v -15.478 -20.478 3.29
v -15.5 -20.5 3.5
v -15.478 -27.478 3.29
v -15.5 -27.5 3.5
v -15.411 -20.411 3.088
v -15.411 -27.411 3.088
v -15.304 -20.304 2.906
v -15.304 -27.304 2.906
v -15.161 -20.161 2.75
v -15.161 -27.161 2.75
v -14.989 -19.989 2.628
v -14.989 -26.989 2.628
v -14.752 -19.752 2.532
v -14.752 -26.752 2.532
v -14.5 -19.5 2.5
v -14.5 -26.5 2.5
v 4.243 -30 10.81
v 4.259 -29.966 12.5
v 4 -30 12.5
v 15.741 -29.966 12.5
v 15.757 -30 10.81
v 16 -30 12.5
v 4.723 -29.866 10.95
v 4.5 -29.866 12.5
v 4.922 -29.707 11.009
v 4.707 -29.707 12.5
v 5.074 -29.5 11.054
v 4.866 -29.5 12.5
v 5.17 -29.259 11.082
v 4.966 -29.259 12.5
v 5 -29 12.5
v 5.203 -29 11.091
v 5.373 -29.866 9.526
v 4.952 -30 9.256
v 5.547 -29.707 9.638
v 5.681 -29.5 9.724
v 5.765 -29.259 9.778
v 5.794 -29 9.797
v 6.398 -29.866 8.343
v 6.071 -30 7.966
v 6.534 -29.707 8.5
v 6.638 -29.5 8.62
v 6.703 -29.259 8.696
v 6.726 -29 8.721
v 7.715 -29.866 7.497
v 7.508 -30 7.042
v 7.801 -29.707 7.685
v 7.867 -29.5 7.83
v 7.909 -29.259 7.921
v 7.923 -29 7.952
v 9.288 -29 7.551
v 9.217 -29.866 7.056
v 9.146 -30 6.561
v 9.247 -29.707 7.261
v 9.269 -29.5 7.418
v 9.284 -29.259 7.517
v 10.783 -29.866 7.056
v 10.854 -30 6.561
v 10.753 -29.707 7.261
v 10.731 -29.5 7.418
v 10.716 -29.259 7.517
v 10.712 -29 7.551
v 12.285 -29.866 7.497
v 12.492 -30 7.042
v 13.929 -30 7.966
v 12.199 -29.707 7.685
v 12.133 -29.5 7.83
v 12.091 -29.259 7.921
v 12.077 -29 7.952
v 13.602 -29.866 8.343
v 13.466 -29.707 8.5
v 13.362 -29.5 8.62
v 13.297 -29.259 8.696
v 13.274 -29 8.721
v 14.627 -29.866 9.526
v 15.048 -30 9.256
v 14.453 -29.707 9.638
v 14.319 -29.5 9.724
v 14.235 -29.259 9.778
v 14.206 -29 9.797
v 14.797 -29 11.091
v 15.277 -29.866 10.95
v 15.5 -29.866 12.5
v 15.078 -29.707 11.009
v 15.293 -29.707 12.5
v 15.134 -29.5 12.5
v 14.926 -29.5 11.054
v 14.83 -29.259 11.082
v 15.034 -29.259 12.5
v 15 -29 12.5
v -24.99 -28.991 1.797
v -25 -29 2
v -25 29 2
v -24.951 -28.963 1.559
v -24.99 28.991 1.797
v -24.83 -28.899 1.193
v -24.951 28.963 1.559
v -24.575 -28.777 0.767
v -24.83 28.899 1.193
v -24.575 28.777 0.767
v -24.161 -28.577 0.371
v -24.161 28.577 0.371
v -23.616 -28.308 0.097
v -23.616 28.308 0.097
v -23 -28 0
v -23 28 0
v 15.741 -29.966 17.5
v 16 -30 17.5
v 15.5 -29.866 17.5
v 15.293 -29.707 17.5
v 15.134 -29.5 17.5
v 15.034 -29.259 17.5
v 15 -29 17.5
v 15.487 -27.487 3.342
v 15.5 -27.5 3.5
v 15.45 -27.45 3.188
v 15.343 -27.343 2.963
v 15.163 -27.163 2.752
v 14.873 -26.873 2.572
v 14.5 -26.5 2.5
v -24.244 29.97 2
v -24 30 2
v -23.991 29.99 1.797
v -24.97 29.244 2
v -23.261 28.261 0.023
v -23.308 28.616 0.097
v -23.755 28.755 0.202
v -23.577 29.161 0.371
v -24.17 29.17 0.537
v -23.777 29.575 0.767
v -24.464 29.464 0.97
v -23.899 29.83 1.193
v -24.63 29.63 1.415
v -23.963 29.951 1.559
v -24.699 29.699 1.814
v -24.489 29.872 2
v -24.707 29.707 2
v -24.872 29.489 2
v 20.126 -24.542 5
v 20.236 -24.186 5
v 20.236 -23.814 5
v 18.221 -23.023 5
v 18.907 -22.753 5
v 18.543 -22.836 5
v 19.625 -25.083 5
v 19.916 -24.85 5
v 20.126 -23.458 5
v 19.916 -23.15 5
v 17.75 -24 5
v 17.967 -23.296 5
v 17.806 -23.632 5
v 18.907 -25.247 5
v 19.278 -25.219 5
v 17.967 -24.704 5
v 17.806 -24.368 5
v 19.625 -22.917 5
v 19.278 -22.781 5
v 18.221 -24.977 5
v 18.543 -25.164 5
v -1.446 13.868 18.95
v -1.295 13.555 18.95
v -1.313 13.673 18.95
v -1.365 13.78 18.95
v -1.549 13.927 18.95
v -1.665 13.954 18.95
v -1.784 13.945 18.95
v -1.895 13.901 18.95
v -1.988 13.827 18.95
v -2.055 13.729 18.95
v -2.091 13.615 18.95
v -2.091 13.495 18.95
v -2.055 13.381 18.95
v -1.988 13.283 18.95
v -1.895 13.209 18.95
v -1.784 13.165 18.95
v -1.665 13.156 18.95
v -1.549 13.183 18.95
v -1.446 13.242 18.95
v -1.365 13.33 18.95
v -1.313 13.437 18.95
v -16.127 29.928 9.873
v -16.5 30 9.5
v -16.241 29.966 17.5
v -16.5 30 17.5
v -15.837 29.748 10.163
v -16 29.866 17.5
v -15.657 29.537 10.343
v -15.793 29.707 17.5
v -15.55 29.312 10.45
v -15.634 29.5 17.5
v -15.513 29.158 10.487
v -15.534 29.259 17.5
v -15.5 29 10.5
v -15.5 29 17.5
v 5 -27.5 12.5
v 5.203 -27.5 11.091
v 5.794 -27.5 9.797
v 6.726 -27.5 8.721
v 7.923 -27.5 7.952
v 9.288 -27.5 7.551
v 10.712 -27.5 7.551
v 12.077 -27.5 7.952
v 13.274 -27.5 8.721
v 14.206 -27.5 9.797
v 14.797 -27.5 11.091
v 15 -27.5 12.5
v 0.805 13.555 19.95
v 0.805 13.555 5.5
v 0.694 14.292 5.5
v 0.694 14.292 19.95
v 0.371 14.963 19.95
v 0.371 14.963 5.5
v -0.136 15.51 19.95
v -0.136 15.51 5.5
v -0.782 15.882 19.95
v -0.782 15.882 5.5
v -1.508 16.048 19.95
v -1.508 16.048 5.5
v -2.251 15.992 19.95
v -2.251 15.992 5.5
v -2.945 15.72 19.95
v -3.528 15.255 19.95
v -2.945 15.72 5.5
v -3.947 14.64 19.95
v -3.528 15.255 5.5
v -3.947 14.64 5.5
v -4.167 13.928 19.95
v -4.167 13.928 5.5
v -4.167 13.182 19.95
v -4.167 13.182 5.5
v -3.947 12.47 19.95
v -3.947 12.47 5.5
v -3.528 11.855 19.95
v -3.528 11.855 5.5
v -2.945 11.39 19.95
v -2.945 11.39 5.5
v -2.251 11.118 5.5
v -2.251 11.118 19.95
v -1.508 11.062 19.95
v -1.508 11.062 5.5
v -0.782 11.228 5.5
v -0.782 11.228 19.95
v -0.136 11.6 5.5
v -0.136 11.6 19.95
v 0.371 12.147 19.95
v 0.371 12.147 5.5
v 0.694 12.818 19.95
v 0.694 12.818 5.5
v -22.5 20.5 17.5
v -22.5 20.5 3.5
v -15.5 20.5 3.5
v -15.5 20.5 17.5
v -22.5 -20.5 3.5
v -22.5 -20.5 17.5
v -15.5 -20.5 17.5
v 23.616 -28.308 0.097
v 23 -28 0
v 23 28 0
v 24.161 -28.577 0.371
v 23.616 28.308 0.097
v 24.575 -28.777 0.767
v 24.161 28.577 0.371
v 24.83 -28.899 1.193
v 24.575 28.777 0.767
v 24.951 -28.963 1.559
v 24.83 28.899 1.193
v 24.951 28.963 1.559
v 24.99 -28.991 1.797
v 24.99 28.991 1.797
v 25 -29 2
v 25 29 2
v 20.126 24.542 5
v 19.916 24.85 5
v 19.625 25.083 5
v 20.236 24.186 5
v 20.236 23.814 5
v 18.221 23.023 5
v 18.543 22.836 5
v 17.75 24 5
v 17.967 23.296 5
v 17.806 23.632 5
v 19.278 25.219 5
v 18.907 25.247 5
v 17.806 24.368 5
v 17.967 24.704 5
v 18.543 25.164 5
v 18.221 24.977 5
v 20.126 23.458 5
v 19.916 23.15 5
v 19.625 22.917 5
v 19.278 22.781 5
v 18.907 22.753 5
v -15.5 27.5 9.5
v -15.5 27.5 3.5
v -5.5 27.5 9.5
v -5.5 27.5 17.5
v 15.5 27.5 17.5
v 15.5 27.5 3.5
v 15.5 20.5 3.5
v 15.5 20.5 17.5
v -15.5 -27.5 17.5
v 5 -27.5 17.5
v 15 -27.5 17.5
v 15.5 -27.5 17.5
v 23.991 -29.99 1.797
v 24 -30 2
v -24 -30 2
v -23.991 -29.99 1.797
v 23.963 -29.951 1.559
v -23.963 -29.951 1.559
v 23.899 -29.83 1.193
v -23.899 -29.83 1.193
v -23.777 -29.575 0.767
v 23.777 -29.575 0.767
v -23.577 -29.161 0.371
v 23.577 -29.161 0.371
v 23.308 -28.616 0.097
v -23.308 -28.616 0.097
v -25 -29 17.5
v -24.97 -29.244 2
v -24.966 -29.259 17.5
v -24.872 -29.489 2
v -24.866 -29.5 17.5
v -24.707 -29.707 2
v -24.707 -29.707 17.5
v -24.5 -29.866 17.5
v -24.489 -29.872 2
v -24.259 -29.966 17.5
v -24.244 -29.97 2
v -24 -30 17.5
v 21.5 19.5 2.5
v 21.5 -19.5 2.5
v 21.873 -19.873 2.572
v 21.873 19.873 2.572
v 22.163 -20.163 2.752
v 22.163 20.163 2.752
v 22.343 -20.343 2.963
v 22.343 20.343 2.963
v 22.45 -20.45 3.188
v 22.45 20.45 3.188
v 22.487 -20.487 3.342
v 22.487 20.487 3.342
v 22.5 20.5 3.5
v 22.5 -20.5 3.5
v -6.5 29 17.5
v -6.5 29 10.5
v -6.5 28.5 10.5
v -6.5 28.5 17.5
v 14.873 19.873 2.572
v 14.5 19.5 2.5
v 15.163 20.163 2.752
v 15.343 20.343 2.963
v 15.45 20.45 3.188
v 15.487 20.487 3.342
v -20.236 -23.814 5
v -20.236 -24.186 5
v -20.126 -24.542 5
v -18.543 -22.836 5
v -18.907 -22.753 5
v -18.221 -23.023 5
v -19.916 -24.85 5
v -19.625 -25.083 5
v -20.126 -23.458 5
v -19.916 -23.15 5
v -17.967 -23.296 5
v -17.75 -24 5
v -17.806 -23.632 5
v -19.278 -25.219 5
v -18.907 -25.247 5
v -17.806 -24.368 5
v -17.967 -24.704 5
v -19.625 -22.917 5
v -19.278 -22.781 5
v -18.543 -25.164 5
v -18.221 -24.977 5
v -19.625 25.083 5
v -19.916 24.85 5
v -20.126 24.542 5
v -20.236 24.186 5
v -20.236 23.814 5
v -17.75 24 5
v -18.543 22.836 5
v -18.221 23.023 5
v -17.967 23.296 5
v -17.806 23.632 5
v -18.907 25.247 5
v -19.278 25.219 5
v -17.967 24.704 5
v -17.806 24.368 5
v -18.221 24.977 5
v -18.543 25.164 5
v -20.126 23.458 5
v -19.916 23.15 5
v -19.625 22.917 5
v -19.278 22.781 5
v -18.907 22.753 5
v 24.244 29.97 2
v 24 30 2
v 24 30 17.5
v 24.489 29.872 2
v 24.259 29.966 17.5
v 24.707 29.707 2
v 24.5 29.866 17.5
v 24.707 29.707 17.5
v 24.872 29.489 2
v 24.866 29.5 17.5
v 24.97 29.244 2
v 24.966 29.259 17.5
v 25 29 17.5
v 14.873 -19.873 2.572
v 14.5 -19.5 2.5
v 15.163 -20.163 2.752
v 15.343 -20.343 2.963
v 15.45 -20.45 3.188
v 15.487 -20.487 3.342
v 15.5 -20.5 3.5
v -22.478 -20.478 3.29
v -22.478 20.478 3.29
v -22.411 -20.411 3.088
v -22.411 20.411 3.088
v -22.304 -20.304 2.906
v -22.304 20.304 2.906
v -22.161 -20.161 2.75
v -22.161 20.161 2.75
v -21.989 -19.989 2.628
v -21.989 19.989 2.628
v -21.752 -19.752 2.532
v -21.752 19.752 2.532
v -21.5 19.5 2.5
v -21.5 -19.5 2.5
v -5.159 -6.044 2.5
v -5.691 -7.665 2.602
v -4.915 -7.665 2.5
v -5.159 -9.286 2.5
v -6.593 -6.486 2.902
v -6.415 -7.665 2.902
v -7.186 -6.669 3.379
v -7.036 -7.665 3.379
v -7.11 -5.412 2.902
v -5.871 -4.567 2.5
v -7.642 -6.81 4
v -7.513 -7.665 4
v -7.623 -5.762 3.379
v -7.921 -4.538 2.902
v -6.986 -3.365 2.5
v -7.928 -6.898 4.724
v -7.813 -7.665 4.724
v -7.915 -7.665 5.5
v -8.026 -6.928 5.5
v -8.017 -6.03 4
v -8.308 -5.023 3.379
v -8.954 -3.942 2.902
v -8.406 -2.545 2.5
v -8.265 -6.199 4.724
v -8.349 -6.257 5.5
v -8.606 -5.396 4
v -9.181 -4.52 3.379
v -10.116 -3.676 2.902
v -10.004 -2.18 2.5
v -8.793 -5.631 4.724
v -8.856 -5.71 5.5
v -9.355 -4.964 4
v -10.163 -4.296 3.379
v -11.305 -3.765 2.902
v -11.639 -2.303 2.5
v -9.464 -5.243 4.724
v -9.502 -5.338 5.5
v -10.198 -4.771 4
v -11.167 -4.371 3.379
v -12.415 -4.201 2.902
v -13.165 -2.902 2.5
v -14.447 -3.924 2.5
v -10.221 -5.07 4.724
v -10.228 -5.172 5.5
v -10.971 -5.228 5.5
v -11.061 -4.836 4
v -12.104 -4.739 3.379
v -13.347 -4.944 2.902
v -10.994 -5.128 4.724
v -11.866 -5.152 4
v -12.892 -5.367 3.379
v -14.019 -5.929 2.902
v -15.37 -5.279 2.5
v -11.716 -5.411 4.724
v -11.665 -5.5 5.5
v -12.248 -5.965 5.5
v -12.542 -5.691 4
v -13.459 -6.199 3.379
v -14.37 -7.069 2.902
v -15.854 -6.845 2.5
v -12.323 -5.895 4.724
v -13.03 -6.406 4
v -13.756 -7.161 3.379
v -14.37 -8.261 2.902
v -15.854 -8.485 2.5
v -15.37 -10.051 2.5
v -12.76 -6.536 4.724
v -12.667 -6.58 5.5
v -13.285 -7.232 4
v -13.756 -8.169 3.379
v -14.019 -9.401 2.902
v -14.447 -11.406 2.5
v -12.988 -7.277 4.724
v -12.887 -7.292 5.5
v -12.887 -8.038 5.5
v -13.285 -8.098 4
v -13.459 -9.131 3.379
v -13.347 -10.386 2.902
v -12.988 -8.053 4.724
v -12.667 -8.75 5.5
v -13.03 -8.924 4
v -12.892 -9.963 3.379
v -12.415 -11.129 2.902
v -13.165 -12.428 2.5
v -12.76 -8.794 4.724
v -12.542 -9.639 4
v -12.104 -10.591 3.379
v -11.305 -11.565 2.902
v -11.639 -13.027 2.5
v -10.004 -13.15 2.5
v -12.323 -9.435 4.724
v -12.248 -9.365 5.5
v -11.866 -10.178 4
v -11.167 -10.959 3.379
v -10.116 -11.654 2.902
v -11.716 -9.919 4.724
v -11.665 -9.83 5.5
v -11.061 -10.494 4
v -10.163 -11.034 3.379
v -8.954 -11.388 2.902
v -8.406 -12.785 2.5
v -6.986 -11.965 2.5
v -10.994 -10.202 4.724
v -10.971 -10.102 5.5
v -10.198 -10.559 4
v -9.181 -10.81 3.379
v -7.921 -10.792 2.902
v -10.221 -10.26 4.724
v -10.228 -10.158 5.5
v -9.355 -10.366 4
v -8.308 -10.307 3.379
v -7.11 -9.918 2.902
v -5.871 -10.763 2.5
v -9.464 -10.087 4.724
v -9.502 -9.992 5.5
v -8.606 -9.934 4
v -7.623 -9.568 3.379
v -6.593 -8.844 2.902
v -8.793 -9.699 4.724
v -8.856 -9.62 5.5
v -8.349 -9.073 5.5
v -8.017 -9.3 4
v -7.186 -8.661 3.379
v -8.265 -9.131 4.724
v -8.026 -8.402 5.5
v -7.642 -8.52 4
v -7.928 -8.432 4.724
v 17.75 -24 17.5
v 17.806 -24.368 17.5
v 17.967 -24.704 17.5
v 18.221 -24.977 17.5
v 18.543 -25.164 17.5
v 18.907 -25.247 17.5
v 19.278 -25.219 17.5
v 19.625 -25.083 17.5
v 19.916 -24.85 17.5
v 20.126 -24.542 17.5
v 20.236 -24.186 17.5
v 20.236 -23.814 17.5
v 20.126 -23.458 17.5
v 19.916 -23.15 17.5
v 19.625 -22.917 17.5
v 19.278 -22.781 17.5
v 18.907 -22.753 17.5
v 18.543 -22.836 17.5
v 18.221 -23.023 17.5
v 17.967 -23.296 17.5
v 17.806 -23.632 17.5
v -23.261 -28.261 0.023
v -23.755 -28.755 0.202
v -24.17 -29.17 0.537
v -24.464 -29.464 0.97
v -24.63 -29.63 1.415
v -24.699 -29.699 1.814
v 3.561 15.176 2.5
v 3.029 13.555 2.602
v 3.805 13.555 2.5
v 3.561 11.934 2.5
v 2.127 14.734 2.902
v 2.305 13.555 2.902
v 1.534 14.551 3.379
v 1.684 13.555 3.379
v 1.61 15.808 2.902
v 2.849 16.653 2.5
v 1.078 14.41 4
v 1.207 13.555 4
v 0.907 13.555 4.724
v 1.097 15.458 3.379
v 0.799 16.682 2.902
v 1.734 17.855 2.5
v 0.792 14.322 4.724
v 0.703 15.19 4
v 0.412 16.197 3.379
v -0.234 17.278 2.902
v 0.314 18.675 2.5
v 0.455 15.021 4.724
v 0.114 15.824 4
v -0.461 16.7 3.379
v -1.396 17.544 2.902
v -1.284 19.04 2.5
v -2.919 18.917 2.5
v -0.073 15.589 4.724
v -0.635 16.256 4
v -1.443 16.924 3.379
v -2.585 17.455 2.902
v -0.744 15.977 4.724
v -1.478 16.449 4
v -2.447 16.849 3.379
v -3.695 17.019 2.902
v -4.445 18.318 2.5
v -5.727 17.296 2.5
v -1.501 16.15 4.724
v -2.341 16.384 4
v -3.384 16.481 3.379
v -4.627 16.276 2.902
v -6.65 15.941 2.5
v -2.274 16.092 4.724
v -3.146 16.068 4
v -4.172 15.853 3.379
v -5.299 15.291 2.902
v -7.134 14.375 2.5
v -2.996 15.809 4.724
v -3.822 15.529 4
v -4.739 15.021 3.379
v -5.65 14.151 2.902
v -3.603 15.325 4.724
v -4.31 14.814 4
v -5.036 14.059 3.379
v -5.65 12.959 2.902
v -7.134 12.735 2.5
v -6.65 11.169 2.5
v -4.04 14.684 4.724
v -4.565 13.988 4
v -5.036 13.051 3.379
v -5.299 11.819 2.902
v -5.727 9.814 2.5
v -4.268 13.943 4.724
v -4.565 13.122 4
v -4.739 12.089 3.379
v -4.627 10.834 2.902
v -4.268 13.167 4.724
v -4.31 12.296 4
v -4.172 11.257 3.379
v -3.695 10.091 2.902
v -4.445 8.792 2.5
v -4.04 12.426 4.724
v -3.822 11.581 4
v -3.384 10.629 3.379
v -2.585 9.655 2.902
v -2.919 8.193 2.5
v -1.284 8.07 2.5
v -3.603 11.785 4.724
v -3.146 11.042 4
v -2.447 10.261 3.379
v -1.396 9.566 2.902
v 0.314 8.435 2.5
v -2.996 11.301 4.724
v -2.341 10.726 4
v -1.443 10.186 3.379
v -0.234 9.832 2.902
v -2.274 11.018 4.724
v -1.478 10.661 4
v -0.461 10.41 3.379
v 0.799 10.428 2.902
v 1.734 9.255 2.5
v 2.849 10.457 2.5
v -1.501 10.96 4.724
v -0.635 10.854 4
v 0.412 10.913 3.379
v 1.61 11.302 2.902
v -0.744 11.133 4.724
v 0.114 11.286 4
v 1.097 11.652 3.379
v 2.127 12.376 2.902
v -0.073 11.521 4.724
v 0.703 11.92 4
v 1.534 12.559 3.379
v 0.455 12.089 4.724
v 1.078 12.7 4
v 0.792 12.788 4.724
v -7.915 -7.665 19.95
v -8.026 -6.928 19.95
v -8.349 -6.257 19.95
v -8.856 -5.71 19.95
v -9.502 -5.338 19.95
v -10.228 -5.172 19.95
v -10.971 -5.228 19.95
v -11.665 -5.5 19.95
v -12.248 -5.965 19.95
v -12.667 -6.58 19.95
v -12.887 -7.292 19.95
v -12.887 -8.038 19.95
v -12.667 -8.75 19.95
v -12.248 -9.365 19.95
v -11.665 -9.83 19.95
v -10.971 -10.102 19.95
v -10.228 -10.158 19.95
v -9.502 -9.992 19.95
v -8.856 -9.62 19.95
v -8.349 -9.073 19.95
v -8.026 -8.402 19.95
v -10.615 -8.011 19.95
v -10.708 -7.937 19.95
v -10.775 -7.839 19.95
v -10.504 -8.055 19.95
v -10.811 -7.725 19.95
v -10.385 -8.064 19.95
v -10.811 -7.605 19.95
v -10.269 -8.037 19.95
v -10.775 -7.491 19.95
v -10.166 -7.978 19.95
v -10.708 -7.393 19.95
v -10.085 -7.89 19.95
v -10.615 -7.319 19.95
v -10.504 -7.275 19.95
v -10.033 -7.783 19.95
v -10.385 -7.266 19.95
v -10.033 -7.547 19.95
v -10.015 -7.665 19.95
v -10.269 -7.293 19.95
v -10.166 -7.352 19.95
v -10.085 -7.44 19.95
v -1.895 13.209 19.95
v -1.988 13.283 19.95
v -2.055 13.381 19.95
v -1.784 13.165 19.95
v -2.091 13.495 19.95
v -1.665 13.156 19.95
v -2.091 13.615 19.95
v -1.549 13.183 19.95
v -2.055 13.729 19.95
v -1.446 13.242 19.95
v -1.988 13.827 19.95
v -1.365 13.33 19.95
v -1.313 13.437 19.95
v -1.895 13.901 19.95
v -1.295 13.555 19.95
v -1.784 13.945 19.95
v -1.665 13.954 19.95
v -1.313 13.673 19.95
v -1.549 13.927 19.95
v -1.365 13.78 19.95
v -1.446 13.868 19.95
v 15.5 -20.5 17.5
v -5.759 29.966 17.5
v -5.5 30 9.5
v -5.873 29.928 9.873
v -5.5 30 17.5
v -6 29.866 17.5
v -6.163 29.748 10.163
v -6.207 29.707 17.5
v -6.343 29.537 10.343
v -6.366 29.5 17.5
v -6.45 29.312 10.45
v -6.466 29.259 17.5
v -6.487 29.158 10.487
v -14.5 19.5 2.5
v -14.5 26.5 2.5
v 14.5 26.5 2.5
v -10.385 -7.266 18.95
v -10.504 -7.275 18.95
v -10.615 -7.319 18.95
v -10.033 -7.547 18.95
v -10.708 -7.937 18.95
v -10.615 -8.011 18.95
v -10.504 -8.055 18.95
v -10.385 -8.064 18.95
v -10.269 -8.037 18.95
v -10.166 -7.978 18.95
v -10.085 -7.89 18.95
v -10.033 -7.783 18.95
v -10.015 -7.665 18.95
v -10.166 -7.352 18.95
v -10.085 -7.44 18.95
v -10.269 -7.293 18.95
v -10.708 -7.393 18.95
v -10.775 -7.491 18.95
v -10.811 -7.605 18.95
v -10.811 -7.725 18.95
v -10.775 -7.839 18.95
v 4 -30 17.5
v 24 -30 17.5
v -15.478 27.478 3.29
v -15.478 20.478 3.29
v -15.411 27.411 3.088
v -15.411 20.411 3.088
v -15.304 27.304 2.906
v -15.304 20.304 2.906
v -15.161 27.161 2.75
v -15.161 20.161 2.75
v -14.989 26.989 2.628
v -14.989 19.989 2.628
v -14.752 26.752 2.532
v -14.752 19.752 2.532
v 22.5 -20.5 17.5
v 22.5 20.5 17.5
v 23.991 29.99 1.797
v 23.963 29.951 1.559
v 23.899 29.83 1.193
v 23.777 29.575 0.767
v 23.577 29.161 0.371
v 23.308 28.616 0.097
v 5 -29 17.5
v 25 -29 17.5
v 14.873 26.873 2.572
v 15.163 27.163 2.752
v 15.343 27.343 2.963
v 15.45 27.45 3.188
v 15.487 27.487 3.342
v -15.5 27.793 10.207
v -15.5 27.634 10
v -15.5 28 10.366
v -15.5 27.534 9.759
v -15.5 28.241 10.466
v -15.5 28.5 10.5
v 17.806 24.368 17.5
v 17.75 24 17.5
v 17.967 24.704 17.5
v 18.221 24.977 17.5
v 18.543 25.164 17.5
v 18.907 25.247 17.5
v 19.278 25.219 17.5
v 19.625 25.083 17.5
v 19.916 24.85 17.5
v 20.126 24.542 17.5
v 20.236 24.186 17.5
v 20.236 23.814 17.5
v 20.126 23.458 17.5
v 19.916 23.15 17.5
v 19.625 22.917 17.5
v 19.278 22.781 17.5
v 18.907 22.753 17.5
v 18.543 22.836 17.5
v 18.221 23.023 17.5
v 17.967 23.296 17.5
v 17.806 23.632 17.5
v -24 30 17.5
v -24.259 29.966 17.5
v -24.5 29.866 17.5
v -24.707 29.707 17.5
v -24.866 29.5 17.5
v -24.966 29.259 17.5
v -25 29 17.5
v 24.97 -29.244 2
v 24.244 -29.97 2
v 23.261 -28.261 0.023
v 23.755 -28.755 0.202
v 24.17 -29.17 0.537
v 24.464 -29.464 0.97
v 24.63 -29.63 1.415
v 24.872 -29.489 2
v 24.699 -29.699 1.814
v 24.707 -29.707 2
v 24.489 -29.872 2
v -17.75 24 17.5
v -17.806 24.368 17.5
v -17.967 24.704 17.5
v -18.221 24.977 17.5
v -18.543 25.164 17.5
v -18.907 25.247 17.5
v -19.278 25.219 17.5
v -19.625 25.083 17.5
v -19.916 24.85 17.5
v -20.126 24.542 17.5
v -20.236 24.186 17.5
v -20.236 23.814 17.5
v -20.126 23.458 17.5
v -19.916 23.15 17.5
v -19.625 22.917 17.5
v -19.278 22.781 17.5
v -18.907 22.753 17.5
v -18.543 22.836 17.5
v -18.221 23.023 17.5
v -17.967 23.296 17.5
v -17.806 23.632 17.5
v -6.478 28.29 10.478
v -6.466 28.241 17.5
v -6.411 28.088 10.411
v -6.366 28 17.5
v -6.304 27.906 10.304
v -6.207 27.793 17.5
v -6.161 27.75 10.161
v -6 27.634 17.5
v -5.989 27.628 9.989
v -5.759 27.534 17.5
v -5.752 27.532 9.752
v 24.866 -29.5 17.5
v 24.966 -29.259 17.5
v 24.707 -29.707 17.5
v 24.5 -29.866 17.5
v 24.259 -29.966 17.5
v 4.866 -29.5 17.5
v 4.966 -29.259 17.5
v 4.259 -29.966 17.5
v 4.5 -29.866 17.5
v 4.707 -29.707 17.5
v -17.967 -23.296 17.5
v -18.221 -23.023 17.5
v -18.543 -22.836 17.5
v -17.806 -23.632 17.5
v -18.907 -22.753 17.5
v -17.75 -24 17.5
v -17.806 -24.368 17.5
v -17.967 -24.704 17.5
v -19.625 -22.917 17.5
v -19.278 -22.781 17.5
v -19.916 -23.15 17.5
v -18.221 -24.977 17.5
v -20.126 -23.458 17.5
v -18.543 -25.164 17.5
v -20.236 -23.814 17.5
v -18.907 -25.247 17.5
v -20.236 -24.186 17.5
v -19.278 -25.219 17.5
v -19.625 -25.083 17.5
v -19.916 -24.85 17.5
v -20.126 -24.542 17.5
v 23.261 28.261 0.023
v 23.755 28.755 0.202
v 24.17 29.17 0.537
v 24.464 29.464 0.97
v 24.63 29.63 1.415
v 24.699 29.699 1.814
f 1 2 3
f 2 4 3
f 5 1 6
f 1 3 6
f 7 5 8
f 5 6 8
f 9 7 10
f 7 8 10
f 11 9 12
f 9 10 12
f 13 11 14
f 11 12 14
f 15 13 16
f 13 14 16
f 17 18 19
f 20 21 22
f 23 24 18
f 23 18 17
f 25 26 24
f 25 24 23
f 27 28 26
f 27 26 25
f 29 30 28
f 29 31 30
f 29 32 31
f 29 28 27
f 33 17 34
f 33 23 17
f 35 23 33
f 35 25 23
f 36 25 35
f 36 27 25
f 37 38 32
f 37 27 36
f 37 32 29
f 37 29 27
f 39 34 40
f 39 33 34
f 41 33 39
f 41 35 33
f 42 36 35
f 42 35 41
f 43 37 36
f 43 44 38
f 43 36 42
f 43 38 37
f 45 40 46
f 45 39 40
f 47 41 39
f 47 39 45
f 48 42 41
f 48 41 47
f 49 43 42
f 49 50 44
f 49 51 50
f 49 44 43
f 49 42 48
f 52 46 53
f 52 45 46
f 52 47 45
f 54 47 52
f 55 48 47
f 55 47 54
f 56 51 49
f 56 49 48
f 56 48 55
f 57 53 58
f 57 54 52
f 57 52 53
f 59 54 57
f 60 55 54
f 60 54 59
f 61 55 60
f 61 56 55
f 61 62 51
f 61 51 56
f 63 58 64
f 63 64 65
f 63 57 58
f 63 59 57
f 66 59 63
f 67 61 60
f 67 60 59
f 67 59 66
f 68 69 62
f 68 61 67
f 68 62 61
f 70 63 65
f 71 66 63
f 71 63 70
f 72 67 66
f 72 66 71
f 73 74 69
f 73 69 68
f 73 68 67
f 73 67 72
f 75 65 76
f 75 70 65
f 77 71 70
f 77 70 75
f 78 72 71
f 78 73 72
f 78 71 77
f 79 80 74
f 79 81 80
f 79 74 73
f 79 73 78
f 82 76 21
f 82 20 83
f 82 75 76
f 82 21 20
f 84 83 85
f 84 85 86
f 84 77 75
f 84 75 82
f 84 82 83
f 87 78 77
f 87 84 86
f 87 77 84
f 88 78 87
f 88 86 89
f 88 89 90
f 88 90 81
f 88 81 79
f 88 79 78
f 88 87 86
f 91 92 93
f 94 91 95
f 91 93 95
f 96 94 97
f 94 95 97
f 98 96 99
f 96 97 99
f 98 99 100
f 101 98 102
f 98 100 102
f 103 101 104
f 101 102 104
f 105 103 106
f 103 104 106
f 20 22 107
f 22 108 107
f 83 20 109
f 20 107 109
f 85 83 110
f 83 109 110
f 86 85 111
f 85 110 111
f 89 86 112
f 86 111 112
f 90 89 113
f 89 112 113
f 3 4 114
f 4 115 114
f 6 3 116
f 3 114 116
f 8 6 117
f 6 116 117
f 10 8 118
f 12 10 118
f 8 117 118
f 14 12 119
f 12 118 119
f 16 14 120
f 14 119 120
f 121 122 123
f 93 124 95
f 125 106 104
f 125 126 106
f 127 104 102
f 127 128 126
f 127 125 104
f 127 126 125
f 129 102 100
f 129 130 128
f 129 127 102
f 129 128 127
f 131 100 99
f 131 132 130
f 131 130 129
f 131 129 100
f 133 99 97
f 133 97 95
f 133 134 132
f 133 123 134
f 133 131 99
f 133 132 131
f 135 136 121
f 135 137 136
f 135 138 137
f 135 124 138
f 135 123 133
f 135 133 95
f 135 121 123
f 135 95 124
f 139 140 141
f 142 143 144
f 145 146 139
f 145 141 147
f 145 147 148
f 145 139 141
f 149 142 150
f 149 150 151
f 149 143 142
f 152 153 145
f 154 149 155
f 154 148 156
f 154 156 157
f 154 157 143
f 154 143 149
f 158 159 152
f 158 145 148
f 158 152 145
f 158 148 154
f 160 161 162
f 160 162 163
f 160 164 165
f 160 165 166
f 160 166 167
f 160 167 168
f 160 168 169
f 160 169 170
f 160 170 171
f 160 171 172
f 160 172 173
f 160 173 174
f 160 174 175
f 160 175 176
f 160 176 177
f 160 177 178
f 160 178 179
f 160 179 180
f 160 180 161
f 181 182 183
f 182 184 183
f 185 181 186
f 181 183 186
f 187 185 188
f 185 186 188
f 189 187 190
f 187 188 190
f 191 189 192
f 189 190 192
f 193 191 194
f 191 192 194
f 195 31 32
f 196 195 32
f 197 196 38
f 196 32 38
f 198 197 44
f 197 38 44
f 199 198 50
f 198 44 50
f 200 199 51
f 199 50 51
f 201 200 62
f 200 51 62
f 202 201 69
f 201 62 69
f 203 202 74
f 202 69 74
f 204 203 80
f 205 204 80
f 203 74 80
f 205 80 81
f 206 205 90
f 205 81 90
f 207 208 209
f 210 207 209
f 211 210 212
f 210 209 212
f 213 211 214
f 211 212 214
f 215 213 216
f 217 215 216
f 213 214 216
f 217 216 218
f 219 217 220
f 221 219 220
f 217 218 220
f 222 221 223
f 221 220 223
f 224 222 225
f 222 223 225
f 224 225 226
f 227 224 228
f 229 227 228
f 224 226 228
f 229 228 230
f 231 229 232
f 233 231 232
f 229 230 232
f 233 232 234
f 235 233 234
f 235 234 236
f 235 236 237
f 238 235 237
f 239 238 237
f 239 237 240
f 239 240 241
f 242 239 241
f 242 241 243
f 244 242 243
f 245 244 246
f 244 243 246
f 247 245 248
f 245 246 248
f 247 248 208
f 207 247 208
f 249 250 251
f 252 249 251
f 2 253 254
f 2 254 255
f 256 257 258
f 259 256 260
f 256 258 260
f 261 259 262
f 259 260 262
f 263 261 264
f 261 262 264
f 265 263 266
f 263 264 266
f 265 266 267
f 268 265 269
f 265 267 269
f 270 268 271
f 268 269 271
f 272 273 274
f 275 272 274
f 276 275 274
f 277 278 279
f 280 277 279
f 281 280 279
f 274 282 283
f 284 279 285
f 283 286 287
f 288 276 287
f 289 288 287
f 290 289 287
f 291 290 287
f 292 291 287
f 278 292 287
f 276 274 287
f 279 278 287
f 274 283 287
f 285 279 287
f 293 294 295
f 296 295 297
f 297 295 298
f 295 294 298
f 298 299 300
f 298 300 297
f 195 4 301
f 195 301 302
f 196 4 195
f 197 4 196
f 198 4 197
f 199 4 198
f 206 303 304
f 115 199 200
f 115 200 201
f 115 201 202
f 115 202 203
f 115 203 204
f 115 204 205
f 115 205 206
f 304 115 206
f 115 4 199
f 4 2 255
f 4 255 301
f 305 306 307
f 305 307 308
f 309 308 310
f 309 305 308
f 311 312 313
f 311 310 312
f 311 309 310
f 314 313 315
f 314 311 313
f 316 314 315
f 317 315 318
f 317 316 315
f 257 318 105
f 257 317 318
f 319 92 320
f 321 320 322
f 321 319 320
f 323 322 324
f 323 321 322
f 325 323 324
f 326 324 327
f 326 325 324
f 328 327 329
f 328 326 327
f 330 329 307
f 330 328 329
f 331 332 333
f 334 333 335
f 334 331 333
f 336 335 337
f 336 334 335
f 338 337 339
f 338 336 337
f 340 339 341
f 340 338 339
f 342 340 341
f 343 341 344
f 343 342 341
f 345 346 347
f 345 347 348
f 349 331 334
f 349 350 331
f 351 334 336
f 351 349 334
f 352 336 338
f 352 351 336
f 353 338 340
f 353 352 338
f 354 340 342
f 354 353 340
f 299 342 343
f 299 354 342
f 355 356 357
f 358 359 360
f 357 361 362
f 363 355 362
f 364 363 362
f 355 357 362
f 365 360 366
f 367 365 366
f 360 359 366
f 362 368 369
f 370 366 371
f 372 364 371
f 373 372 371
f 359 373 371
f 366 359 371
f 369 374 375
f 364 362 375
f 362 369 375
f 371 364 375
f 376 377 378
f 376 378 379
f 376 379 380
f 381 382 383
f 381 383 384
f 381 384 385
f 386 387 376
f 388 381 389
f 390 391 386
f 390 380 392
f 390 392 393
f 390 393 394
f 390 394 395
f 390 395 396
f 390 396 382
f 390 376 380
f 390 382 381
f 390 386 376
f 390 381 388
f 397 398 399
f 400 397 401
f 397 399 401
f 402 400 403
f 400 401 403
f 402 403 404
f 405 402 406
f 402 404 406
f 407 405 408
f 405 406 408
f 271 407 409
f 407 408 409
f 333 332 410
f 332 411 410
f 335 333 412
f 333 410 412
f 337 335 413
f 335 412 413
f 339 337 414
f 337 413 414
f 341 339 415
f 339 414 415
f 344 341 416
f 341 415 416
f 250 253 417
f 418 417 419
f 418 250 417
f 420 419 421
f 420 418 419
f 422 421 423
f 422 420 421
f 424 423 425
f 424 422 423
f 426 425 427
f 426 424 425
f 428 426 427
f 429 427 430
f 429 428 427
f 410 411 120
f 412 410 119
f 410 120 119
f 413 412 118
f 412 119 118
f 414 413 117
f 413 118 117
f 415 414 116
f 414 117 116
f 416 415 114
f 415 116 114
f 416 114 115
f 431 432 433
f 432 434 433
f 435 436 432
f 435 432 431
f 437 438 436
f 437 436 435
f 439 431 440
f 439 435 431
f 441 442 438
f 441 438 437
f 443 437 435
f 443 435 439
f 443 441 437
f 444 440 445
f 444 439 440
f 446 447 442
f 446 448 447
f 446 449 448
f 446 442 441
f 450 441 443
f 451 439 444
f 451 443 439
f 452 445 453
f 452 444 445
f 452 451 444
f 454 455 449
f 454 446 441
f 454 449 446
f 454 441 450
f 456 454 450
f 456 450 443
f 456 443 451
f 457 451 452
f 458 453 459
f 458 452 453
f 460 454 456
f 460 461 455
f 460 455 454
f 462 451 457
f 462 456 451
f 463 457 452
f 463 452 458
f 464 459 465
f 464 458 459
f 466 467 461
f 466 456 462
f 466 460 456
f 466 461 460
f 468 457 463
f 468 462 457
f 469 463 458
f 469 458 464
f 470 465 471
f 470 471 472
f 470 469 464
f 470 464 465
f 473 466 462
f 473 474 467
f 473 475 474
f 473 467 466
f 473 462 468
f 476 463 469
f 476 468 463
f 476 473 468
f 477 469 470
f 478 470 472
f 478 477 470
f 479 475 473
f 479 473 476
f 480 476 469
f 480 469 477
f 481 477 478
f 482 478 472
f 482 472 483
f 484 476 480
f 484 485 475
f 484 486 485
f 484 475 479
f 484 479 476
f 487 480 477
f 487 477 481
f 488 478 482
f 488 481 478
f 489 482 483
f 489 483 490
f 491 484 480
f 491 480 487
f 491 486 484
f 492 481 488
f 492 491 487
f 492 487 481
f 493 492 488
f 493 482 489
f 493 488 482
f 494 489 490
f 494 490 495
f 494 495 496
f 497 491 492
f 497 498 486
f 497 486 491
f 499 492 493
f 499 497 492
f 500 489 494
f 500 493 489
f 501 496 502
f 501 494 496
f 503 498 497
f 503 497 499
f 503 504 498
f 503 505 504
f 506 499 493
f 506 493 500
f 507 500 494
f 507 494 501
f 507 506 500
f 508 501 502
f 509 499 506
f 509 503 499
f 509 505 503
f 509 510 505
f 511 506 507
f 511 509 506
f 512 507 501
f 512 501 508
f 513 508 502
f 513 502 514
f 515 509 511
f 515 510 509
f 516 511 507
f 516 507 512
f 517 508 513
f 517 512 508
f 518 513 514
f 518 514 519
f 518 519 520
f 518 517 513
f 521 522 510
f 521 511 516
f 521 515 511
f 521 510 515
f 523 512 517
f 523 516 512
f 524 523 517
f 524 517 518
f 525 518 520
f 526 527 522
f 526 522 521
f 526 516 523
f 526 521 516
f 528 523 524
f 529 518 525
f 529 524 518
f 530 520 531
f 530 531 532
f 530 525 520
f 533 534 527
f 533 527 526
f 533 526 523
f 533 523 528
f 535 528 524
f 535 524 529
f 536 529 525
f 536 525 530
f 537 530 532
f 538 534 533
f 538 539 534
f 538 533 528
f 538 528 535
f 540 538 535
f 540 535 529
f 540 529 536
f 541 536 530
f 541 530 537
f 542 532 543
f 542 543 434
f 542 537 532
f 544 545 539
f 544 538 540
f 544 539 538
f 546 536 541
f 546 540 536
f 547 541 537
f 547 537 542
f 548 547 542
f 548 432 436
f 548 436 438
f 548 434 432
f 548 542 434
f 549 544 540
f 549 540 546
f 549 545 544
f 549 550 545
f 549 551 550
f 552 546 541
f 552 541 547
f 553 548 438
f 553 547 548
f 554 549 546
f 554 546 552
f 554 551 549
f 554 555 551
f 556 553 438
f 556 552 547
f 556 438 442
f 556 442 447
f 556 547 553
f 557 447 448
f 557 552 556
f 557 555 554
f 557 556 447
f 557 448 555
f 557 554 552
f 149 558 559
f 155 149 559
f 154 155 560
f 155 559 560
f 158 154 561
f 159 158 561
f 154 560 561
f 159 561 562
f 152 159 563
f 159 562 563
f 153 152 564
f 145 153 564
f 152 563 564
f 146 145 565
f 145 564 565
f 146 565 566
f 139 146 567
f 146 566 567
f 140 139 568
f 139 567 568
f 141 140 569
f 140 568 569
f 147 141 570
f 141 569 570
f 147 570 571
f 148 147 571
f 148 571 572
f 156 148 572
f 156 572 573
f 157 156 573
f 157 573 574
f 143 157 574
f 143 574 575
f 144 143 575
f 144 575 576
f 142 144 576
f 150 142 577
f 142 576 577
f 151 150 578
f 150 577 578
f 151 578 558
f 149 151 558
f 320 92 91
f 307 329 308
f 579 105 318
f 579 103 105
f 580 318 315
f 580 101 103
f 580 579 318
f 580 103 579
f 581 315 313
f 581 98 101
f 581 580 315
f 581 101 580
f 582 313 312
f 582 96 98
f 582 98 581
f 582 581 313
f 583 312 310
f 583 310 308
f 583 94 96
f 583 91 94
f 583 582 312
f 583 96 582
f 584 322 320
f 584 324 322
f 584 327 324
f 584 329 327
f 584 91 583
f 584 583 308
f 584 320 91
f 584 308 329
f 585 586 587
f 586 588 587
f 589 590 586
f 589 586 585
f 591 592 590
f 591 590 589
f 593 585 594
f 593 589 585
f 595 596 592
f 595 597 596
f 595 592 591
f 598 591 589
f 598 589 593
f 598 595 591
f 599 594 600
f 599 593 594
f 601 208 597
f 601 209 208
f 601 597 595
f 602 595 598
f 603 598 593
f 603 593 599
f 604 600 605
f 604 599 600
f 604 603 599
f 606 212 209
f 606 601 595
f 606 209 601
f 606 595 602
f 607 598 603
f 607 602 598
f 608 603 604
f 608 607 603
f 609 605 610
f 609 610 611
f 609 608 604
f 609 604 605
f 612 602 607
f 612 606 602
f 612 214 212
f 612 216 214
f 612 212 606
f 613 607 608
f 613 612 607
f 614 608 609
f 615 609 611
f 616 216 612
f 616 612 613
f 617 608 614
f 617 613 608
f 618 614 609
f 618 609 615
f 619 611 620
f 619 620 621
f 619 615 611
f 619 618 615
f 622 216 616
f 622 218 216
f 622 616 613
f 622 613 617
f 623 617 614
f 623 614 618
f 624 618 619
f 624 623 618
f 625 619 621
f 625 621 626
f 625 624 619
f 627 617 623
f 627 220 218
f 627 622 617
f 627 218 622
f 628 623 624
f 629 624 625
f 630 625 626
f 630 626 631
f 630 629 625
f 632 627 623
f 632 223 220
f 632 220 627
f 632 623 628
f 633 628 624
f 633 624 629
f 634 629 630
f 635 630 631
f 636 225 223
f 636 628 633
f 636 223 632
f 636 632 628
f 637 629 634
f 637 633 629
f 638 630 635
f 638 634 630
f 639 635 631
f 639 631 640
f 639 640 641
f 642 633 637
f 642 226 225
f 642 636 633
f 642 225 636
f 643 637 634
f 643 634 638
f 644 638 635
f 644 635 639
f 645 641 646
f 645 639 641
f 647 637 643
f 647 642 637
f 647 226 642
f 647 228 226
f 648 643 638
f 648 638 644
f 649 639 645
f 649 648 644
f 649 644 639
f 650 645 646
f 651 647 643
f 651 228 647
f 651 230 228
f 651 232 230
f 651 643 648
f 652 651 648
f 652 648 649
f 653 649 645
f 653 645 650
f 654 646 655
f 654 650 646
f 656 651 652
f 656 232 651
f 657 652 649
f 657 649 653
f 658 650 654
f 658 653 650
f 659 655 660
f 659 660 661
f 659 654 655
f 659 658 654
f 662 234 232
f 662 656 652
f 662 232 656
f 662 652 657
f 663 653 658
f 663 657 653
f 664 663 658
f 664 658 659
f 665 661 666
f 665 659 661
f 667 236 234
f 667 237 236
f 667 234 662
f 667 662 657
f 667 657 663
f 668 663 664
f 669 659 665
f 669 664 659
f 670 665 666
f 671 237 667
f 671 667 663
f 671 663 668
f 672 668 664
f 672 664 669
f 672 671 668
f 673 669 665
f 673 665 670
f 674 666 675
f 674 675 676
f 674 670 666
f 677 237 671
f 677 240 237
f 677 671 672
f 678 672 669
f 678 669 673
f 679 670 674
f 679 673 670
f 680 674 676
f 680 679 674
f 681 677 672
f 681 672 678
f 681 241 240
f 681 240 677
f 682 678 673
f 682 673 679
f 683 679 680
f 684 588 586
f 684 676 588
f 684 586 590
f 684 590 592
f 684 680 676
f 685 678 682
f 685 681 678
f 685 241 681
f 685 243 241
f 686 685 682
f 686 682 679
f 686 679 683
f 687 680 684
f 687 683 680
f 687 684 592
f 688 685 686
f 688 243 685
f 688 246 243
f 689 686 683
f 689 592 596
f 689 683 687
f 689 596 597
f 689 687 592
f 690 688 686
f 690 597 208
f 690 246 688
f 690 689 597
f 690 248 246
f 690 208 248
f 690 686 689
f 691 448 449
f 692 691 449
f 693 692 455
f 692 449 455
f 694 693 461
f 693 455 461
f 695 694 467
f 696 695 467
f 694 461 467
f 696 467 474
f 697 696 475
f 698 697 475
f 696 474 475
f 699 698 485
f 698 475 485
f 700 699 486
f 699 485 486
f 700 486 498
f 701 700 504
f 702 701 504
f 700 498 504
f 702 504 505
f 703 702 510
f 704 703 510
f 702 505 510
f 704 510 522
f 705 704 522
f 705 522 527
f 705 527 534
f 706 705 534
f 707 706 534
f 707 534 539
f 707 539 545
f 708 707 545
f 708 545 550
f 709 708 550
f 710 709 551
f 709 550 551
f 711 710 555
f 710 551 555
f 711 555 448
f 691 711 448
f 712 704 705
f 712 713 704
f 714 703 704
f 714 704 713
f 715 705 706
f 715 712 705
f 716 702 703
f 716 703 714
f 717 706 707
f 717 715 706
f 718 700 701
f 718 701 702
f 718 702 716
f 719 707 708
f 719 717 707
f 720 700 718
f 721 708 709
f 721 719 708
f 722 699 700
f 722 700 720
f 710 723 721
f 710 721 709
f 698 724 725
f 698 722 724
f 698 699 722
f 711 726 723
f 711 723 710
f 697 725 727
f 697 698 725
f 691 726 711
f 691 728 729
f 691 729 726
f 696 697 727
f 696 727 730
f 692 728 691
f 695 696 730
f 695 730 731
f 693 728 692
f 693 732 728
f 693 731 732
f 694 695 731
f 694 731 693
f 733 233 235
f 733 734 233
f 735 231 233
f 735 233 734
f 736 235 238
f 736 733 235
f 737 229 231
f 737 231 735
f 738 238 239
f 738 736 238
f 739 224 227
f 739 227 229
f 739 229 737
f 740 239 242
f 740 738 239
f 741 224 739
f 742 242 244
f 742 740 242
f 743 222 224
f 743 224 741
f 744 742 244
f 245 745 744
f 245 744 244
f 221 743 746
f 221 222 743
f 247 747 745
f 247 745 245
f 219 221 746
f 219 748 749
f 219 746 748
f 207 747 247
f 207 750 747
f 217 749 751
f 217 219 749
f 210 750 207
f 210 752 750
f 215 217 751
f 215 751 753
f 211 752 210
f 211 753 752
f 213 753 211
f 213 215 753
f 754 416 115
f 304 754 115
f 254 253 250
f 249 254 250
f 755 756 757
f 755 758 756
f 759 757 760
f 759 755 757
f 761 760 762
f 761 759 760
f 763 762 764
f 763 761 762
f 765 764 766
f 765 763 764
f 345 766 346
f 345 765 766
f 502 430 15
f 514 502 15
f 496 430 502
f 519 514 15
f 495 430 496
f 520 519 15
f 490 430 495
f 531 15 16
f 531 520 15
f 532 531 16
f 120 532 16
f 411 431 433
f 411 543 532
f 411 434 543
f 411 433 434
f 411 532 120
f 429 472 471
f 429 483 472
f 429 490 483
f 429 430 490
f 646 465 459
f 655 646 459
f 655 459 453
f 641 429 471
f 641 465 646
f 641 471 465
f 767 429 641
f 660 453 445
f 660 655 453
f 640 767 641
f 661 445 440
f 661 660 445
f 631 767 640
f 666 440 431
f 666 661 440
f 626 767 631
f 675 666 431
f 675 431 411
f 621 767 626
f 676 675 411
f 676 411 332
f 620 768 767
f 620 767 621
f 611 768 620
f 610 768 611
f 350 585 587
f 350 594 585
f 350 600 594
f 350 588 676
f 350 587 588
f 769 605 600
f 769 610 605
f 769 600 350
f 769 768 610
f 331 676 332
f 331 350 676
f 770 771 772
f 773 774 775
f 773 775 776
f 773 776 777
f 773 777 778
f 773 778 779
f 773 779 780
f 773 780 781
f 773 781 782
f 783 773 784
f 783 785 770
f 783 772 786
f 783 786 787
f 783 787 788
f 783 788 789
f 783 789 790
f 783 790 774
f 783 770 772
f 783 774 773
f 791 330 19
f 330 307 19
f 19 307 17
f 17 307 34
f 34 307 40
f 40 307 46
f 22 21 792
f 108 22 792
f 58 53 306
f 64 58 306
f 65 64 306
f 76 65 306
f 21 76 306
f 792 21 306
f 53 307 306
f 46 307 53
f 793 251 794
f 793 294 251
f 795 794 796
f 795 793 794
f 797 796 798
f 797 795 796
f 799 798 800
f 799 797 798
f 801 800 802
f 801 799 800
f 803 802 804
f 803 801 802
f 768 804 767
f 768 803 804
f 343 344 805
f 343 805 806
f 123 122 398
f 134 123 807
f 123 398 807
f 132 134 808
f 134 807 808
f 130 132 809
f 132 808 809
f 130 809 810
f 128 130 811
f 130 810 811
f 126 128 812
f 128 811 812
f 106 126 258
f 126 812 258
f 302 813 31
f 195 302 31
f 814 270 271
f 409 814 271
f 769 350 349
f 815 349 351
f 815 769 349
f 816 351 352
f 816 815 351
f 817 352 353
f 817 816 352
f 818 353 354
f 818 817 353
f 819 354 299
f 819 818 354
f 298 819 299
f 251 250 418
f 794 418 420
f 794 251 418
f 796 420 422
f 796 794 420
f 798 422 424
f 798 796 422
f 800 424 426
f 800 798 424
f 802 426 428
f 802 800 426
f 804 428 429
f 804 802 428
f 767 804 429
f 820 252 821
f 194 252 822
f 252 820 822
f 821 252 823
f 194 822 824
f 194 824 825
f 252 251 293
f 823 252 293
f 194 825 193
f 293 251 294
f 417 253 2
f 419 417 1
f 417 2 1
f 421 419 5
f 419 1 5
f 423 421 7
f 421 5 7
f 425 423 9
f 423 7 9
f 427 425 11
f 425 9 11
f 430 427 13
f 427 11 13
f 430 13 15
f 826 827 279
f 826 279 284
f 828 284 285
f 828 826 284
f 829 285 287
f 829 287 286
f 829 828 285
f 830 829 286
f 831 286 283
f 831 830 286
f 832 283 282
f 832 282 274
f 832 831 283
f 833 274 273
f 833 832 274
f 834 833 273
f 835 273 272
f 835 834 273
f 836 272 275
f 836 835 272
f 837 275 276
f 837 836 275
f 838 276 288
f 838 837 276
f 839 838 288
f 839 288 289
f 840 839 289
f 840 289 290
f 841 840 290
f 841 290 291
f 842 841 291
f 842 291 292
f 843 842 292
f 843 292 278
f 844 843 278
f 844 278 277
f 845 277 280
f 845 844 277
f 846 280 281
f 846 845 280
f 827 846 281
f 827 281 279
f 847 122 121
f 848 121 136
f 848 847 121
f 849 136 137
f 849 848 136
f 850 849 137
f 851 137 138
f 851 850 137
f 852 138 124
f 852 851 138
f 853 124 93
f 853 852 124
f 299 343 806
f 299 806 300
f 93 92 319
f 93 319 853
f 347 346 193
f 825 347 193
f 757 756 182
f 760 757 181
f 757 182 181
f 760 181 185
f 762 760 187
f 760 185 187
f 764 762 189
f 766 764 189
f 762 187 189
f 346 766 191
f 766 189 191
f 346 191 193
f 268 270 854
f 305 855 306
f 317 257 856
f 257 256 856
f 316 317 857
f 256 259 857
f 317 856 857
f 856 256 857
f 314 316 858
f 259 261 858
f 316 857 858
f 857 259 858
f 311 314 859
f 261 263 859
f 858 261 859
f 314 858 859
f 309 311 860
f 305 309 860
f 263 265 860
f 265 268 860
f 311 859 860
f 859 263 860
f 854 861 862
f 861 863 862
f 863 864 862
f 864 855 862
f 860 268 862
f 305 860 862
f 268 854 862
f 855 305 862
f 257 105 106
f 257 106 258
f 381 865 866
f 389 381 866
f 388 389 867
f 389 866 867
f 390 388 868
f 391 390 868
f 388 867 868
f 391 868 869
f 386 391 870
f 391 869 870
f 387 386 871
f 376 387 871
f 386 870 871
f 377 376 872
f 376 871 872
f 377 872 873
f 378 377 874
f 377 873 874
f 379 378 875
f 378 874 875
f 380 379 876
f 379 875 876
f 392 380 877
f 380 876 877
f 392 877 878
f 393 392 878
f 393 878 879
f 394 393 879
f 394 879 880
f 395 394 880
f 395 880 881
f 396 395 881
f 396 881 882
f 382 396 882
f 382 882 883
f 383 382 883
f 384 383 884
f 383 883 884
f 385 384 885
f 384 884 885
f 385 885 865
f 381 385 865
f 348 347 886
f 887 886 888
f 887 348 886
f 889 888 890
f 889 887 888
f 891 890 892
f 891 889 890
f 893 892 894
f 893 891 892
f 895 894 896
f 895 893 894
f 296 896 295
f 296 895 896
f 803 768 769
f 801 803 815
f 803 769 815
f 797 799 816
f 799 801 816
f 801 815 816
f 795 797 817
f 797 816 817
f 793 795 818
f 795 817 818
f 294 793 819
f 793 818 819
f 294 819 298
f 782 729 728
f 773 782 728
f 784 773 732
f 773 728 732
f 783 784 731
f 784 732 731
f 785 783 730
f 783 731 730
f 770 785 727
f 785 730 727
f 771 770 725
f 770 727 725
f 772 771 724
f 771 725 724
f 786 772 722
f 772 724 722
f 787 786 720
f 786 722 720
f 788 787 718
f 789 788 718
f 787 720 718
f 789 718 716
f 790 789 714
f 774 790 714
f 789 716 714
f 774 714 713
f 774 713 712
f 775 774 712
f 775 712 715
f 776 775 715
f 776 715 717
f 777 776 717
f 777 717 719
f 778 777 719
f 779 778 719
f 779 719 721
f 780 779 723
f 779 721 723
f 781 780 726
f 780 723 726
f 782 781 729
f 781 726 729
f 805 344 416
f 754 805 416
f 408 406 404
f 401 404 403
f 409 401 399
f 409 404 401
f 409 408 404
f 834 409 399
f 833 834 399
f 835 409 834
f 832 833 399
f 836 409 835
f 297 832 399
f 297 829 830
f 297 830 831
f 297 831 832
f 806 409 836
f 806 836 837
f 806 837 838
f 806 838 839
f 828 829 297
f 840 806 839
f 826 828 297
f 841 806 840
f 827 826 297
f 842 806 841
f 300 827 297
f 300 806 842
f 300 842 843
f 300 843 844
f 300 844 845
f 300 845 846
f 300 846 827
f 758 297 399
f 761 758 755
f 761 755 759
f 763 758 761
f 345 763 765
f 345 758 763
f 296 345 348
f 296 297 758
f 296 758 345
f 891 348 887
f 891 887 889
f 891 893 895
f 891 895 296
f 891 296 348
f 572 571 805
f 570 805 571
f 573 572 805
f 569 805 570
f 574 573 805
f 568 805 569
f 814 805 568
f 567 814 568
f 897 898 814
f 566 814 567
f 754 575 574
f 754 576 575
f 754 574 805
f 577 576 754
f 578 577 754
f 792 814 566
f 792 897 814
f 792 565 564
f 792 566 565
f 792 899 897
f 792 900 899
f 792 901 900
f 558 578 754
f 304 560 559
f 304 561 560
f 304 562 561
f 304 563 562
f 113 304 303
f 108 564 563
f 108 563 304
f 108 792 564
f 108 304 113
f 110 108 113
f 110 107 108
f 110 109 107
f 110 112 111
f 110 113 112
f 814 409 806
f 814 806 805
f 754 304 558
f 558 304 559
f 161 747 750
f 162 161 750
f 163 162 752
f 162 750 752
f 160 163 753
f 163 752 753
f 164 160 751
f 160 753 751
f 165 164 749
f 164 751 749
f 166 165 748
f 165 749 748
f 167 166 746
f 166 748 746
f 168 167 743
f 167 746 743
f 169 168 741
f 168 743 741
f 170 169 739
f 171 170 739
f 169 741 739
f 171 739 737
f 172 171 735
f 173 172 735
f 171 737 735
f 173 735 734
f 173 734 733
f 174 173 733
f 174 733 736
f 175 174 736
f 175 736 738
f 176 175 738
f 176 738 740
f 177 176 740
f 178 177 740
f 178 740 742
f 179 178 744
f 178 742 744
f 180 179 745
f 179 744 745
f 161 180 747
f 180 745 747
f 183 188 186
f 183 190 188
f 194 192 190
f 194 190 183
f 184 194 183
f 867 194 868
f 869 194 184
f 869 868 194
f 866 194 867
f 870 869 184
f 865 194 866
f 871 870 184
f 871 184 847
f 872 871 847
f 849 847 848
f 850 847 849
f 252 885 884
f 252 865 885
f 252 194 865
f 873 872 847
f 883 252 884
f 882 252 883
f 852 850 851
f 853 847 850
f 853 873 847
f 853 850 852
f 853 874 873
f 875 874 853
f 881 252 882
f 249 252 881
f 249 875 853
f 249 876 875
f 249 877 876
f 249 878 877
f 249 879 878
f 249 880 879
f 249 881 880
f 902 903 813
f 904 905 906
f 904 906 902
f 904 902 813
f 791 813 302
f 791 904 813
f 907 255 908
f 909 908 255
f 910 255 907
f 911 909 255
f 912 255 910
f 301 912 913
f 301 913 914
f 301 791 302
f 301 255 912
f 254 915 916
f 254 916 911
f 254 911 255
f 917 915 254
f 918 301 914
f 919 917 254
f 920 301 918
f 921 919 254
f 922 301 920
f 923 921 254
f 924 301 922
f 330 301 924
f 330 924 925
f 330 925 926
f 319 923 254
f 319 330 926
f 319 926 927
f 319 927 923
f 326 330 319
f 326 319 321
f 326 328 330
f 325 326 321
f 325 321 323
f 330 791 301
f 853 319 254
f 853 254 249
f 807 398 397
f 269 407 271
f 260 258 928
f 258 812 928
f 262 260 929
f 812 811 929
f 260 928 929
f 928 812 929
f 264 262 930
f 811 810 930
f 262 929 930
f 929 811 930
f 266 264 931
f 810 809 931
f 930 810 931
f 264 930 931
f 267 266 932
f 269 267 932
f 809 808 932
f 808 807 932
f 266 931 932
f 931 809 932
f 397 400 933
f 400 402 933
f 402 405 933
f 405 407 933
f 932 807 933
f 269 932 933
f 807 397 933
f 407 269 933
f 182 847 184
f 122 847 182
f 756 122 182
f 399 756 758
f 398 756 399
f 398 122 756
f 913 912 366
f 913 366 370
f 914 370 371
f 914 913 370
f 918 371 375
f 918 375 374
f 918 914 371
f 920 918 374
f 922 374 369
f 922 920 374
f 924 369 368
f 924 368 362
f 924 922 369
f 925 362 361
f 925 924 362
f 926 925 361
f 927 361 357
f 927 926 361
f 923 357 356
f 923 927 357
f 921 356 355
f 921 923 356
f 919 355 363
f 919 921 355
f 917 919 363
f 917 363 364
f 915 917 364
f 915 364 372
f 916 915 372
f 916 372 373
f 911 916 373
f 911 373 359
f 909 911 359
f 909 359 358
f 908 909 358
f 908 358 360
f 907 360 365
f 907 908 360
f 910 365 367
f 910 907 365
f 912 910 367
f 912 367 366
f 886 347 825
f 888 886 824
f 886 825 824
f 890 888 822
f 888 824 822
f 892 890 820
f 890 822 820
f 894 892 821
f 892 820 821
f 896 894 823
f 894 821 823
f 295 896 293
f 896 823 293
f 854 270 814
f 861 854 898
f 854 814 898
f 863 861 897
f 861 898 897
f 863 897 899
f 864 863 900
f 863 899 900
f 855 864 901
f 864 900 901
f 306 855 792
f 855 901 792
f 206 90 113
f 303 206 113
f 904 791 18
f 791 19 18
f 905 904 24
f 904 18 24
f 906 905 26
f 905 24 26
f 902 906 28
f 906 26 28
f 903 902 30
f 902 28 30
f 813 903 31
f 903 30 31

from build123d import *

# Parameters (mm, degrees)
SKETCH001_W                   = 50
SKETCH001_H                   = 60
PAD001_DEPTH                  = 17.5
THICKNESS_T                   = -2.5
SKETCH002_R                   = 2.5
PAD002_DEPTH                  = 17.45
SKETCH003_R                   = 0.4
POCKET_DEPTH                  = 1
SKETCH004_W                   = 7
SKETCH004_H                   = 7
PAD003_DEPTH                  = 15
SKETCH004_MIRRORED_2_W        = 7
SKETCH004_MIRRORED_2_H        = 7
PAD003_MIRRORED_2_DEPTH       = 15
SKETCH005_R                   = 1.25
POCKET001_DEPTH               = 12.5
SKETCH005_MIRRORED002_2_R     = 1.25
POCKET001_MIRRORED002_2_DEPTH = 12.5
POCKET002_DEPTH               = 2.5
SKETCH007_W                   = 9
SKETCH007_H                   = 7
POCKET003_DEPTH               = 2.5
FILLET_R                      = 3
FILLET001_R                   = 2
FILLET002_R                   = 1
FILLET003_R                   = 1
FILLET004_R                   = 1
FILLET005_R                   = 1


with BuildPart() as part:
    # Sketch001 → Pad001 (new body)
    with BuildSketch(Plane.XY):
        Rectangle(SKETCH001_W, SKETCH001_H)
    extrude(amount=PAD001_DEPTH)

    # Thickness
    thickness_openings = [part.faces().sort_by_distance(p)[0] for p in [
        (0, 0, 17.5),
    ]]
    offset(amount=THICKNESS_T, openings=thickness_openings)

    # Sketch002 (on Face11 of Thickness) → Pad002 (join)
    with BuildSketch(Plane.XY.offset(2.5)):
        with Locations((-10.415, -7.665)):
            Circle(SKETCH002_R)
        with Locations((-1.695, 13.555)):
            Circle(SKETCH002_R)
    extrude(amount=PAD002_DEPTH)

    # Sketch003 (on Face14 of Pad002) → Pocket (cut)
    with BuildSketch(Plane.XY.offset(19.95)):
        with Locations((-10.415, -7.665)):
            Circle(SKETCH003_R)
        with Locations((-1.695, 13.555)):
            Circle(SKETCH003_R)
    extrude(amount=-POCKET_DEPTH, mode=Mode.SUBTRACT)

    # Sketch004 (on Face11 of Pocket) → Pad003 (join)
    with BuildSketch(Plane.XY.offset(2.5)):
        with Locations((-19, 24)):
            Rectangle(SKETCH004_W, SKETCH004_H)
    pad003 = extrude(amount=PAD003_DEPTH)

    # Sketch004 Mirrored 2 → Pad003 Mirrored 2 (add)
    with BuildSketch(Plane(origin=(0, 0, 2.5), x_dir=(-1, 0, 0), z_dir=(0, 0, -1))):
        with Locations((-19, 24)):
            Rectangle(SKETCH004_MIRRORED_2_W, SKETCH004_MIRRORED_2_H)
    pad003_mirrored_2 = extrude(amount=-PAD003_MIRRORED_2_DEPTH)

    # Mirrored001: Pad003, Pad003 Mirrored 2 across Sketch004 H_Axis
    add(pad003.mirror(Plane(origin=(0, 0, 2.5), x_dir=(0, 0, 1), z_dir=(0, 1, 0))))
    add(pad003_mirrored_2.mirror(Plane(origin=(0, 0, 2.5), x_dir=(0, 0, 1), z_dir=(0, 1, 0))))

    # Sketch005 (on Face11 of MultiTransform) → Pocket001 (cut)
    with BuildSketch(Plane.XY.offset(17.5)):
        with Locations((-19, 24)):
            Circle(SKETCH005_R)
    pocket001 = extrude(amount=-POCKET001_DEPTH, mode=Mode.SUBTRACT)

    # Sketch005 Mirrored002 2 → Pocket001 Mirrored002 2 (cut)
    with BuildSketch(Plane(origin=(0, 0, 17.5), x_dir=(-1, 0, 0), z_dir=(0, 0, -1))):
        with Locations((-19, 24)):
            Circle(SKETCH005_MIRRORED002_2_R)
    pocket001_mirrored002_2 = extrude(amount=POCKET001_MIRRORED002_2_DEPTH, mode=Mode.SUBTRACT)

    # Mirrored003: Pocket001, Pocket001 Mirrored002 2 across Sketch005 H_Axis
    add(pocket001.mirror(Plane(origin=(0, 0, 17.5), x_dir=(0, 0, 1), z_dir=(0, 1, 0))), mode=Mode.SUBTRACT)
    add(pocket001_mirrored002_2.mirror(Plane(origin=(0, 0, 17.5), x_dir=(0, 0, 1), z_dir=(0, 1, 0))), mode=Mode.SUBTRACT)

    # Sketch006 (on Face6 of MultiTransform001) → Pocket002 (cut)
    with BuildSketch(Plane.XZ.offset(30)):
        with BuildLine():
            ThreePointArc((15, 17.5), (10, 22.5), (5, 17.5))
            Line((5, 17.5), (5, 12.5))
            ThreePointArc((5, 12.5), (10, 7.5), (15, 12.5))
            Line((15, 12.5), (15, 17.5))
        make_face()
    extrude(amount=-POCKET002_DEPTH, mode=Mode.SUBTRACT)

    # Sketch007 (on Face1 of Pocket002) → Pocket003 (cut)
    with BuildSketch(Plane(origin=(0, 30, 0), x_dir=(-1, 0, 0), z_dir=(0, 1, 0))):
        with Locations((11, 14)):
            Rectangle(SKETCH007_W, SKETCH007_H)
    extrude(amount=-POCKET003_DEPTH, mode=Mode.SUBTRACT)

    # Fillet
    fillet_edges = [part.edges().sort_by_distance(p)[0] for p in [
        (-12.915, -7.665, 2.5),
        (-4.195, 13.555, 2.5),
    ]]
    fillet(fillet_edges, radius=FILLET_R)

    # Fillet001
    fillet001_edges = [part.edges().sort_by_distance(p)[0] for p in [
        (-25, 0, 0),
        (0, -30, 0),
        (25, 0, 0),
        (0, 30, 0),
    ]]
    fillet(fillet001_edges, radius=FILLET001_R)

    # Fillet002
    fillet002_edges = [part.edges().sort_by_distance(p)[0] for p in [
        (-25, -30, 9.75),
        (25, -30, 9.75),
        (25, 30, 9.75),
        (-25, 30, 9.75),
    ]]
    fillet(fillet002_edges, radius=FILLET002_R)

    # Fillet003
    fillet003_edges = [part.edges().sort_by_distance(p)[0] for p in [
        (-11, 30, 10.5),
        (-15.5, 30, 14),
        (-6.5, 30, 14),
        (-6.5, 27.5, 14),
        (-11, 27.5, 10.5),
    ]]
    fillet(fillet003_edges, radius=FILLET003_R)

    # Fillet004
    fillet004_edges = [part.edges().sort_by_distance(p)[0] for p in [
        (10, -30, 7.5),
        (5, -30, 15),
        (15, -30, 15),
    ]]
    fillet(fillet004_edges, radius=FILLET004_R)

    # Fillet005
    fillet005_edges = [part.edges().sort_by_distance(p)[0] for p in [
        (19, -20.5, 2.5),
        (15.5, -24, 2.5),
        (-15.5, -24, 2.5),
        (-19, -20.5, 2.5),
        (-15.5, 24, 2.5),
        (-19, 20.5, 2.5),
        (19, 20.5, 2.5),
        (15.5, 24, 2.5),
        (0, 27.5, 2.5),
        (22.5, 0, 2.5),
        (0, -27.5, 2.5),
        (-22.5, 0, 2.5),
    ]]
    fillet(fillet005_edges, radius=FILLET005_R)


solid = part.part
